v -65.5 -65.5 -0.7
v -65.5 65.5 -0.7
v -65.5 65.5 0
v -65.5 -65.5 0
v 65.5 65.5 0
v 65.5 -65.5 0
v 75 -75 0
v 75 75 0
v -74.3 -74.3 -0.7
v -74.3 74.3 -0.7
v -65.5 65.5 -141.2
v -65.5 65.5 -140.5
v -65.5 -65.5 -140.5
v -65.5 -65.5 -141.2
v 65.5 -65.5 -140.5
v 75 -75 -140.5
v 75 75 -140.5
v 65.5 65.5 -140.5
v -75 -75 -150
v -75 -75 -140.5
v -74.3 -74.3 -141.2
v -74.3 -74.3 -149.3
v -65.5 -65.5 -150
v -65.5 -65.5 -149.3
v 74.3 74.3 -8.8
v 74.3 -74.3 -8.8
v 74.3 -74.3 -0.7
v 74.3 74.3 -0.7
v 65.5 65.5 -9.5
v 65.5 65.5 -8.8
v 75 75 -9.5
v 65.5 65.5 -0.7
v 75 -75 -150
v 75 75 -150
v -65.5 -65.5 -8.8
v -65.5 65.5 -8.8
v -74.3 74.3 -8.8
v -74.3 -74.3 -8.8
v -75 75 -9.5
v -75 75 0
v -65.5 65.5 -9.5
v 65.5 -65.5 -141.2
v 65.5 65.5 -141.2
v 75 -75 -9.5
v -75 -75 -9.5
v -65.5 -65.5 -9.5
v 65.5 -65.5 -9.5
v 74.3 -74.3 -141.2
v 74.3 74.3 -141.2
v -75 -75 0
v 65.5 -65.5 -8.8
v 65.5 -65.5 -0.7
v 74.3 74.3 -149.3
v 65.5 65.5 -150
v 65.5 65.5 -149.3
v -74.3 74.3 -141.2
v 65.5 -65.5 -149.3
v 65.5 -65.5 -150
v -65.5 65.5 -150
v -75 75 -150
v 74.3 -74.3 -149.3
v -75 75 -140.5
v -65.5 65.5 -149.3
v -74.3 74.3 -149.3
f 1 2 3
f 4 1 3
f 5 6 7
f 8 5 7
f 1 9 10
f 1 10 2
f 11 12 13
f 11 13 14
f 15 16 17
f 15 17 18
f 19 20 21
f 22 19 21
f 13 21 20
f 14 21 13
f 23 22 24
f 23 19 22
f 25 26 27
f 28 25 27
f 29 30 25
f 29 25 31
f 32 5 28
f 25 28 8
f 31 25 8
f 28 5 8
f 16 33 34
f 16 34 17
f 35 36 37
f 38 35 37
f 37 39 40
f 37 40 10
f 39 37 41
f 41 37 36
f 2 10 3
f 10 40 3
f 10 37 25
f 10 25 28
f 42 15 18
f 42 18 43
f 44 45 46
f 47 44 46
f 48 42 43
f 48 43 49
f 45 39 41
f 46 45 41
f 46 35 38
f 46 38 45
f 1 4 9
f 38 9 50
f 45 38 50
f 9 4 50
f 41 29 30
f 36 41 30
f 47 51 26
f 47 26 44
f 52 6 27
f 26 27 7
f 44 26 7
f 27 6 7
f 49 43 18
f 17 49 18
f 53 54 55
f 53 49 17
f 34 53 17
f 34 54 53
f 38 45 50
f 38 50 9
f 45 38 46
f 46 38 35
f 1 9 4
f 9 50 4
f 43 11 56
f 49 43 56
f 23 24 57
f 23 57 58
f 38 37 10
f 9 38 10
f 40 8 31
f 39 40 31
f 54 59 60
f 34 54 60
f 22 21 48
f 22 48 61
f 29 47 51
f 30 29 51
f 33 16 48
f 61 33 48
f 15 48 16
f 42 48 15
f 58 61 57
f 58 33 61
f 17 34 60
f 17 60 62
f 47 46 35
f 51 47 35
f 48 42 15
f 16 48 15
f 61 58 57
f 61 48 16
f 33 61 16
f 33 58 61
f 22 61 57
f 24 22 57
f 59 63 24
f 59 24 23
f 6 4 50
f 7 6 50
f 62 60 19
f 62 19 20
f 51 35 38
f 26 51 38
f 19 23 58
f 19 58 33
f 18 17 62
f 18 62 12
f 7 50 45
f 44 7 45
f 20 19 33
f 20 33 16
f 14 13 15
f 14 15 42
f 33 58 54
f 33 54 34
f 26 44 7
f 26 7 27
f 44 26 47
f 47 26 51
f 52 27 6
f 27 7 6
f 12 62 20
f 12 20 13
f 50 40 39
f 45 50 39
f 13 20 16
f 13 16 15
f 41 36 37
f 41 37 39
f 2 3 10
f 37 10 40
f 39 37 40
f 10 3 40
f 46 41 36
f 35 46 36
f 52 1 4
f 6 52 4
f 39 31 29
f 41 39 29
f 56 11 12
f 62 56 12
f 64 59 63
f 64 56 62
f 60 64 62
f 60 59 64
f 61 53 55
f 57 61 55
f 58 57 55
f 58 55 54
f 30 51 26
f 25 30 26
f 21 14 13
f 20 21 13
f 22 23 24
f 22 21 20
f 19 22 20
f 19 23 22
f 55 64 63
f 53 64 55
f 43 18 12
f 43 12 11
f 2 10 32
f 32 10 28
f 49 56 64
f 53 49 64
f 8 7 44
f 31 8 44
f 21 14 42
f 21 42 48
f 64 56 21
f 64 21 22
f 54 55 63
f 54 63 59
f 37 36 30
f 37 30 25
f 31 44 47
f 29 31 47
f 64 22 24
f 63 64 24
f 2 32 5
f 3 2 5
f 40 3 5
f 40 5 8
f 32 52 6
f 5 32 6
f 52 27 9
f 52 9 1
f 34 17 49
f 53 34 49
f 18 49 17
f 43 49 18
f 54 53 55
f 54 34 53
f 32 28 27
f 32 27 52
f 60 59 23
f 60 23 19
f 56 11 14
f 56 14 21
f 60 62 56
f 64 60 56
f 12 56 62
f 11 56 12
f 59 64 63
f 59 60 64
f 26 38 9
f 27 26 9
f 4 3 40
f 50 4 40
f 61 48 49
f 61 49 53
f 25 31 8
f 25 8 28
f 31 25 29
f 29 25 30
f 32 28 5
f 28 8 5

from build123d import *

# Parameters (mm, degrees)
C_CHANNEL_80_X_8_1_DEPTH      = 164.435028843
C_CHANNEL_80_X_8_1_DEPTH_BACK = 14.435028843
C_CHANNEL_80_X_8_1_2_DEPTH    = 178.870057685
C_CHANNEL_80_X_8_1_3_DEPTH    = 178.870057685
C_CHANNEL_80_X_8_1_4_DEPTH    = 178.870057685


with BuildPart() as part:
    # Sketch11 → C channel 80 X 8(1) (new, two sides)
    with BuildSketch(Plane(origin=(-75, 75, 0), x_dir=(0, 1, 0), z_dir=(1, 0, 0))) as c_channel_80_x_8_1_sk:
        Polygon((0, 0), (0, -9.5), (-9.5, -9.5), (-9.5, -8.8), (-0.7, -8.8), (-0.7, -0.7), (-9.5, -0.7), (-9.5, 0), align=None)
    extrude(amount=C_CHANNEL_80_X_8_1_DEPTH)
    extrude(c_channel_80_x_8_1_sk.sketch, amount=-C_CHANNEL_80_X_8_1_DEPTH_BACK)

    # C channel 80 X 8(1) mitre 1
    split(bisect_by=Plane(origin=(-75, 75, 0), x_dir=(-0.707106781, 0.707106781, 0), z_dir=(0.707106781, 0.707106781, 0)), keep=Keep.TOP)

    # C channel 80 X 8(1) mitre 2
    split(bisect_by=Plane(origin=(75, 75, 0), x_dir=(-0.707106781, -0.707106781, 0), z_dir=(-0.707106781, 0.707106781, 0)), keep=Keep.TOP)


with BuildPart() as body_2:
    # Sketch11 on segment 2 (carried to segment 2) → C channel 80 X 8_1 2 (new body)
    with BuildSketch(Plane(origin=(75, 89.435028843, 0), x_dir=(1, 0, 0), z_dir=(0, -1, 0))):
        Polygon((0, 0), (0, -9.5), (-9.5, -9.5), (-9.5, -8.8), (-0.7, -8.8), (-0.7, -0.7), (-9.5, -0.7), (-9.5, 0), align=None)
    extrude(amount=C_CHANNEL_80_X_8_1_2_DEPTH)

    # C channel 80 X 8_1 2 mitre 1
    split(bisect_by=Plane(origin=(75, 75, 0), x_dir=(0.707106781, 0.707106781, 0), z_dir=(0.707106781, -0.707106781, 0)), keep=Keep.TOP)

    # C channel 80 X 8_1 2 mitre 2
    split(bisect_by=Plane(origin=(75, -75, 0), x_dir=(-0.707106781, 0.707106781, 0), z_dir=(0.707106781, 0.707106781, 0)), keep=Keep.TOP)


with BuildPart() as body_3:
    # Sketch11 on segment 3 (carried to segment 3) → C channel 80 X 8_1 3 (new body)
    with BuildSketch(Plane(origin=(89.435028843, -75, 0), x_dir=(0, -1, 0), z_dir=(-1, 0, 0))):
        Polygon((0, 0), (0, -9.5), (-9.5, -9.5), (-9.5, -8.8), (-0.7, -8.8), (-0.7, -0.7), (-9.5, -0.7), (-9.5, 0), align=None)
    extrude(amount=C_CHANNEL_80_X_8_1_3_DEPTH)

    # C channel 80 X 8_1 3 mitre 1
    split(bisect_by=Plane(origin=(-75, -75, 0), x_dir=(0.707106781, 0.707106781, 0), z_dir=(0.707106781, -0.707106781, 0)), keep=Keep.TOP)

    # C channel 80 X 8_1 3 mitre 2
    split(bisect_by=Plane(origin=(75, -75, 0), x_dir=(0.707106781, -0.707106781, 0), z_dir=(-0.707106781, -0.707106781, 0)), keep=Keep.TOP)


with BuildPart() as body_4:
    # Sketch11 on segment 4 (carried to segment 4) → C channel 80 X 8_1 4 (new body)
    with BuildSketch(Plane(origin=(-75, -89.435028843, 0), x_dir=(-1, 0, 0), z_dir=(0, 1, 0))):
        Polygon((0, 0), (0, -9.5), (-9.5, -9.5), (-9.5, -8.8), (-0.7, -8.8), (-0.7, -0.7), (-9.5, -0.7), (-9.5, 0), align=None)
    extrude(amount=C_CHANNEL_80_X_8_1_4_DEPTH)

    # C channel 80 X 8_1 4 mitre 1
    split(bisect_by=Plane(origin=(-75, 75, 0), x_dir=(0.707106781, -0.707106781, 0), z_dir=(-0.707106781, -0.707106781, 0)), keep=Keep.TOP)

    # C channel 80 X 8_1 4 mitre 2
    split(bisect_by=Plane(origin=(-75, -75, 0), x_dir=(-0.707106781, -0.707106781, 0), z_dir=(-0.707106781, 0.707106781, 0)), keep=Keep.TOP)


with BuildPart() as body_5:
    # Mirror1: mirrored copy
    add(body_3.part.mirror(Plane.XY.offset(-75)))


with BuildPart() as body_6:
    # Mirror1 2: mirrored copy
    add(body_4.part.mirror(Plane.XY.offset(-75)))


with BuildPart() as body_7:
    # Mirror1 3: mirrored copy
    add(body_2.part.mirror(Plane.XY.offset(-75)))


with BuildPart() as body_8:
    # Mirror1 4: mirrored copy
    add(part.part.mirror(Plane.XY.offset(-75)))


solid = Compound([part.part, body_2.part, body_3.part, body_4.part, body_5.part, body_6.part, body_7.part, body_8.part])
